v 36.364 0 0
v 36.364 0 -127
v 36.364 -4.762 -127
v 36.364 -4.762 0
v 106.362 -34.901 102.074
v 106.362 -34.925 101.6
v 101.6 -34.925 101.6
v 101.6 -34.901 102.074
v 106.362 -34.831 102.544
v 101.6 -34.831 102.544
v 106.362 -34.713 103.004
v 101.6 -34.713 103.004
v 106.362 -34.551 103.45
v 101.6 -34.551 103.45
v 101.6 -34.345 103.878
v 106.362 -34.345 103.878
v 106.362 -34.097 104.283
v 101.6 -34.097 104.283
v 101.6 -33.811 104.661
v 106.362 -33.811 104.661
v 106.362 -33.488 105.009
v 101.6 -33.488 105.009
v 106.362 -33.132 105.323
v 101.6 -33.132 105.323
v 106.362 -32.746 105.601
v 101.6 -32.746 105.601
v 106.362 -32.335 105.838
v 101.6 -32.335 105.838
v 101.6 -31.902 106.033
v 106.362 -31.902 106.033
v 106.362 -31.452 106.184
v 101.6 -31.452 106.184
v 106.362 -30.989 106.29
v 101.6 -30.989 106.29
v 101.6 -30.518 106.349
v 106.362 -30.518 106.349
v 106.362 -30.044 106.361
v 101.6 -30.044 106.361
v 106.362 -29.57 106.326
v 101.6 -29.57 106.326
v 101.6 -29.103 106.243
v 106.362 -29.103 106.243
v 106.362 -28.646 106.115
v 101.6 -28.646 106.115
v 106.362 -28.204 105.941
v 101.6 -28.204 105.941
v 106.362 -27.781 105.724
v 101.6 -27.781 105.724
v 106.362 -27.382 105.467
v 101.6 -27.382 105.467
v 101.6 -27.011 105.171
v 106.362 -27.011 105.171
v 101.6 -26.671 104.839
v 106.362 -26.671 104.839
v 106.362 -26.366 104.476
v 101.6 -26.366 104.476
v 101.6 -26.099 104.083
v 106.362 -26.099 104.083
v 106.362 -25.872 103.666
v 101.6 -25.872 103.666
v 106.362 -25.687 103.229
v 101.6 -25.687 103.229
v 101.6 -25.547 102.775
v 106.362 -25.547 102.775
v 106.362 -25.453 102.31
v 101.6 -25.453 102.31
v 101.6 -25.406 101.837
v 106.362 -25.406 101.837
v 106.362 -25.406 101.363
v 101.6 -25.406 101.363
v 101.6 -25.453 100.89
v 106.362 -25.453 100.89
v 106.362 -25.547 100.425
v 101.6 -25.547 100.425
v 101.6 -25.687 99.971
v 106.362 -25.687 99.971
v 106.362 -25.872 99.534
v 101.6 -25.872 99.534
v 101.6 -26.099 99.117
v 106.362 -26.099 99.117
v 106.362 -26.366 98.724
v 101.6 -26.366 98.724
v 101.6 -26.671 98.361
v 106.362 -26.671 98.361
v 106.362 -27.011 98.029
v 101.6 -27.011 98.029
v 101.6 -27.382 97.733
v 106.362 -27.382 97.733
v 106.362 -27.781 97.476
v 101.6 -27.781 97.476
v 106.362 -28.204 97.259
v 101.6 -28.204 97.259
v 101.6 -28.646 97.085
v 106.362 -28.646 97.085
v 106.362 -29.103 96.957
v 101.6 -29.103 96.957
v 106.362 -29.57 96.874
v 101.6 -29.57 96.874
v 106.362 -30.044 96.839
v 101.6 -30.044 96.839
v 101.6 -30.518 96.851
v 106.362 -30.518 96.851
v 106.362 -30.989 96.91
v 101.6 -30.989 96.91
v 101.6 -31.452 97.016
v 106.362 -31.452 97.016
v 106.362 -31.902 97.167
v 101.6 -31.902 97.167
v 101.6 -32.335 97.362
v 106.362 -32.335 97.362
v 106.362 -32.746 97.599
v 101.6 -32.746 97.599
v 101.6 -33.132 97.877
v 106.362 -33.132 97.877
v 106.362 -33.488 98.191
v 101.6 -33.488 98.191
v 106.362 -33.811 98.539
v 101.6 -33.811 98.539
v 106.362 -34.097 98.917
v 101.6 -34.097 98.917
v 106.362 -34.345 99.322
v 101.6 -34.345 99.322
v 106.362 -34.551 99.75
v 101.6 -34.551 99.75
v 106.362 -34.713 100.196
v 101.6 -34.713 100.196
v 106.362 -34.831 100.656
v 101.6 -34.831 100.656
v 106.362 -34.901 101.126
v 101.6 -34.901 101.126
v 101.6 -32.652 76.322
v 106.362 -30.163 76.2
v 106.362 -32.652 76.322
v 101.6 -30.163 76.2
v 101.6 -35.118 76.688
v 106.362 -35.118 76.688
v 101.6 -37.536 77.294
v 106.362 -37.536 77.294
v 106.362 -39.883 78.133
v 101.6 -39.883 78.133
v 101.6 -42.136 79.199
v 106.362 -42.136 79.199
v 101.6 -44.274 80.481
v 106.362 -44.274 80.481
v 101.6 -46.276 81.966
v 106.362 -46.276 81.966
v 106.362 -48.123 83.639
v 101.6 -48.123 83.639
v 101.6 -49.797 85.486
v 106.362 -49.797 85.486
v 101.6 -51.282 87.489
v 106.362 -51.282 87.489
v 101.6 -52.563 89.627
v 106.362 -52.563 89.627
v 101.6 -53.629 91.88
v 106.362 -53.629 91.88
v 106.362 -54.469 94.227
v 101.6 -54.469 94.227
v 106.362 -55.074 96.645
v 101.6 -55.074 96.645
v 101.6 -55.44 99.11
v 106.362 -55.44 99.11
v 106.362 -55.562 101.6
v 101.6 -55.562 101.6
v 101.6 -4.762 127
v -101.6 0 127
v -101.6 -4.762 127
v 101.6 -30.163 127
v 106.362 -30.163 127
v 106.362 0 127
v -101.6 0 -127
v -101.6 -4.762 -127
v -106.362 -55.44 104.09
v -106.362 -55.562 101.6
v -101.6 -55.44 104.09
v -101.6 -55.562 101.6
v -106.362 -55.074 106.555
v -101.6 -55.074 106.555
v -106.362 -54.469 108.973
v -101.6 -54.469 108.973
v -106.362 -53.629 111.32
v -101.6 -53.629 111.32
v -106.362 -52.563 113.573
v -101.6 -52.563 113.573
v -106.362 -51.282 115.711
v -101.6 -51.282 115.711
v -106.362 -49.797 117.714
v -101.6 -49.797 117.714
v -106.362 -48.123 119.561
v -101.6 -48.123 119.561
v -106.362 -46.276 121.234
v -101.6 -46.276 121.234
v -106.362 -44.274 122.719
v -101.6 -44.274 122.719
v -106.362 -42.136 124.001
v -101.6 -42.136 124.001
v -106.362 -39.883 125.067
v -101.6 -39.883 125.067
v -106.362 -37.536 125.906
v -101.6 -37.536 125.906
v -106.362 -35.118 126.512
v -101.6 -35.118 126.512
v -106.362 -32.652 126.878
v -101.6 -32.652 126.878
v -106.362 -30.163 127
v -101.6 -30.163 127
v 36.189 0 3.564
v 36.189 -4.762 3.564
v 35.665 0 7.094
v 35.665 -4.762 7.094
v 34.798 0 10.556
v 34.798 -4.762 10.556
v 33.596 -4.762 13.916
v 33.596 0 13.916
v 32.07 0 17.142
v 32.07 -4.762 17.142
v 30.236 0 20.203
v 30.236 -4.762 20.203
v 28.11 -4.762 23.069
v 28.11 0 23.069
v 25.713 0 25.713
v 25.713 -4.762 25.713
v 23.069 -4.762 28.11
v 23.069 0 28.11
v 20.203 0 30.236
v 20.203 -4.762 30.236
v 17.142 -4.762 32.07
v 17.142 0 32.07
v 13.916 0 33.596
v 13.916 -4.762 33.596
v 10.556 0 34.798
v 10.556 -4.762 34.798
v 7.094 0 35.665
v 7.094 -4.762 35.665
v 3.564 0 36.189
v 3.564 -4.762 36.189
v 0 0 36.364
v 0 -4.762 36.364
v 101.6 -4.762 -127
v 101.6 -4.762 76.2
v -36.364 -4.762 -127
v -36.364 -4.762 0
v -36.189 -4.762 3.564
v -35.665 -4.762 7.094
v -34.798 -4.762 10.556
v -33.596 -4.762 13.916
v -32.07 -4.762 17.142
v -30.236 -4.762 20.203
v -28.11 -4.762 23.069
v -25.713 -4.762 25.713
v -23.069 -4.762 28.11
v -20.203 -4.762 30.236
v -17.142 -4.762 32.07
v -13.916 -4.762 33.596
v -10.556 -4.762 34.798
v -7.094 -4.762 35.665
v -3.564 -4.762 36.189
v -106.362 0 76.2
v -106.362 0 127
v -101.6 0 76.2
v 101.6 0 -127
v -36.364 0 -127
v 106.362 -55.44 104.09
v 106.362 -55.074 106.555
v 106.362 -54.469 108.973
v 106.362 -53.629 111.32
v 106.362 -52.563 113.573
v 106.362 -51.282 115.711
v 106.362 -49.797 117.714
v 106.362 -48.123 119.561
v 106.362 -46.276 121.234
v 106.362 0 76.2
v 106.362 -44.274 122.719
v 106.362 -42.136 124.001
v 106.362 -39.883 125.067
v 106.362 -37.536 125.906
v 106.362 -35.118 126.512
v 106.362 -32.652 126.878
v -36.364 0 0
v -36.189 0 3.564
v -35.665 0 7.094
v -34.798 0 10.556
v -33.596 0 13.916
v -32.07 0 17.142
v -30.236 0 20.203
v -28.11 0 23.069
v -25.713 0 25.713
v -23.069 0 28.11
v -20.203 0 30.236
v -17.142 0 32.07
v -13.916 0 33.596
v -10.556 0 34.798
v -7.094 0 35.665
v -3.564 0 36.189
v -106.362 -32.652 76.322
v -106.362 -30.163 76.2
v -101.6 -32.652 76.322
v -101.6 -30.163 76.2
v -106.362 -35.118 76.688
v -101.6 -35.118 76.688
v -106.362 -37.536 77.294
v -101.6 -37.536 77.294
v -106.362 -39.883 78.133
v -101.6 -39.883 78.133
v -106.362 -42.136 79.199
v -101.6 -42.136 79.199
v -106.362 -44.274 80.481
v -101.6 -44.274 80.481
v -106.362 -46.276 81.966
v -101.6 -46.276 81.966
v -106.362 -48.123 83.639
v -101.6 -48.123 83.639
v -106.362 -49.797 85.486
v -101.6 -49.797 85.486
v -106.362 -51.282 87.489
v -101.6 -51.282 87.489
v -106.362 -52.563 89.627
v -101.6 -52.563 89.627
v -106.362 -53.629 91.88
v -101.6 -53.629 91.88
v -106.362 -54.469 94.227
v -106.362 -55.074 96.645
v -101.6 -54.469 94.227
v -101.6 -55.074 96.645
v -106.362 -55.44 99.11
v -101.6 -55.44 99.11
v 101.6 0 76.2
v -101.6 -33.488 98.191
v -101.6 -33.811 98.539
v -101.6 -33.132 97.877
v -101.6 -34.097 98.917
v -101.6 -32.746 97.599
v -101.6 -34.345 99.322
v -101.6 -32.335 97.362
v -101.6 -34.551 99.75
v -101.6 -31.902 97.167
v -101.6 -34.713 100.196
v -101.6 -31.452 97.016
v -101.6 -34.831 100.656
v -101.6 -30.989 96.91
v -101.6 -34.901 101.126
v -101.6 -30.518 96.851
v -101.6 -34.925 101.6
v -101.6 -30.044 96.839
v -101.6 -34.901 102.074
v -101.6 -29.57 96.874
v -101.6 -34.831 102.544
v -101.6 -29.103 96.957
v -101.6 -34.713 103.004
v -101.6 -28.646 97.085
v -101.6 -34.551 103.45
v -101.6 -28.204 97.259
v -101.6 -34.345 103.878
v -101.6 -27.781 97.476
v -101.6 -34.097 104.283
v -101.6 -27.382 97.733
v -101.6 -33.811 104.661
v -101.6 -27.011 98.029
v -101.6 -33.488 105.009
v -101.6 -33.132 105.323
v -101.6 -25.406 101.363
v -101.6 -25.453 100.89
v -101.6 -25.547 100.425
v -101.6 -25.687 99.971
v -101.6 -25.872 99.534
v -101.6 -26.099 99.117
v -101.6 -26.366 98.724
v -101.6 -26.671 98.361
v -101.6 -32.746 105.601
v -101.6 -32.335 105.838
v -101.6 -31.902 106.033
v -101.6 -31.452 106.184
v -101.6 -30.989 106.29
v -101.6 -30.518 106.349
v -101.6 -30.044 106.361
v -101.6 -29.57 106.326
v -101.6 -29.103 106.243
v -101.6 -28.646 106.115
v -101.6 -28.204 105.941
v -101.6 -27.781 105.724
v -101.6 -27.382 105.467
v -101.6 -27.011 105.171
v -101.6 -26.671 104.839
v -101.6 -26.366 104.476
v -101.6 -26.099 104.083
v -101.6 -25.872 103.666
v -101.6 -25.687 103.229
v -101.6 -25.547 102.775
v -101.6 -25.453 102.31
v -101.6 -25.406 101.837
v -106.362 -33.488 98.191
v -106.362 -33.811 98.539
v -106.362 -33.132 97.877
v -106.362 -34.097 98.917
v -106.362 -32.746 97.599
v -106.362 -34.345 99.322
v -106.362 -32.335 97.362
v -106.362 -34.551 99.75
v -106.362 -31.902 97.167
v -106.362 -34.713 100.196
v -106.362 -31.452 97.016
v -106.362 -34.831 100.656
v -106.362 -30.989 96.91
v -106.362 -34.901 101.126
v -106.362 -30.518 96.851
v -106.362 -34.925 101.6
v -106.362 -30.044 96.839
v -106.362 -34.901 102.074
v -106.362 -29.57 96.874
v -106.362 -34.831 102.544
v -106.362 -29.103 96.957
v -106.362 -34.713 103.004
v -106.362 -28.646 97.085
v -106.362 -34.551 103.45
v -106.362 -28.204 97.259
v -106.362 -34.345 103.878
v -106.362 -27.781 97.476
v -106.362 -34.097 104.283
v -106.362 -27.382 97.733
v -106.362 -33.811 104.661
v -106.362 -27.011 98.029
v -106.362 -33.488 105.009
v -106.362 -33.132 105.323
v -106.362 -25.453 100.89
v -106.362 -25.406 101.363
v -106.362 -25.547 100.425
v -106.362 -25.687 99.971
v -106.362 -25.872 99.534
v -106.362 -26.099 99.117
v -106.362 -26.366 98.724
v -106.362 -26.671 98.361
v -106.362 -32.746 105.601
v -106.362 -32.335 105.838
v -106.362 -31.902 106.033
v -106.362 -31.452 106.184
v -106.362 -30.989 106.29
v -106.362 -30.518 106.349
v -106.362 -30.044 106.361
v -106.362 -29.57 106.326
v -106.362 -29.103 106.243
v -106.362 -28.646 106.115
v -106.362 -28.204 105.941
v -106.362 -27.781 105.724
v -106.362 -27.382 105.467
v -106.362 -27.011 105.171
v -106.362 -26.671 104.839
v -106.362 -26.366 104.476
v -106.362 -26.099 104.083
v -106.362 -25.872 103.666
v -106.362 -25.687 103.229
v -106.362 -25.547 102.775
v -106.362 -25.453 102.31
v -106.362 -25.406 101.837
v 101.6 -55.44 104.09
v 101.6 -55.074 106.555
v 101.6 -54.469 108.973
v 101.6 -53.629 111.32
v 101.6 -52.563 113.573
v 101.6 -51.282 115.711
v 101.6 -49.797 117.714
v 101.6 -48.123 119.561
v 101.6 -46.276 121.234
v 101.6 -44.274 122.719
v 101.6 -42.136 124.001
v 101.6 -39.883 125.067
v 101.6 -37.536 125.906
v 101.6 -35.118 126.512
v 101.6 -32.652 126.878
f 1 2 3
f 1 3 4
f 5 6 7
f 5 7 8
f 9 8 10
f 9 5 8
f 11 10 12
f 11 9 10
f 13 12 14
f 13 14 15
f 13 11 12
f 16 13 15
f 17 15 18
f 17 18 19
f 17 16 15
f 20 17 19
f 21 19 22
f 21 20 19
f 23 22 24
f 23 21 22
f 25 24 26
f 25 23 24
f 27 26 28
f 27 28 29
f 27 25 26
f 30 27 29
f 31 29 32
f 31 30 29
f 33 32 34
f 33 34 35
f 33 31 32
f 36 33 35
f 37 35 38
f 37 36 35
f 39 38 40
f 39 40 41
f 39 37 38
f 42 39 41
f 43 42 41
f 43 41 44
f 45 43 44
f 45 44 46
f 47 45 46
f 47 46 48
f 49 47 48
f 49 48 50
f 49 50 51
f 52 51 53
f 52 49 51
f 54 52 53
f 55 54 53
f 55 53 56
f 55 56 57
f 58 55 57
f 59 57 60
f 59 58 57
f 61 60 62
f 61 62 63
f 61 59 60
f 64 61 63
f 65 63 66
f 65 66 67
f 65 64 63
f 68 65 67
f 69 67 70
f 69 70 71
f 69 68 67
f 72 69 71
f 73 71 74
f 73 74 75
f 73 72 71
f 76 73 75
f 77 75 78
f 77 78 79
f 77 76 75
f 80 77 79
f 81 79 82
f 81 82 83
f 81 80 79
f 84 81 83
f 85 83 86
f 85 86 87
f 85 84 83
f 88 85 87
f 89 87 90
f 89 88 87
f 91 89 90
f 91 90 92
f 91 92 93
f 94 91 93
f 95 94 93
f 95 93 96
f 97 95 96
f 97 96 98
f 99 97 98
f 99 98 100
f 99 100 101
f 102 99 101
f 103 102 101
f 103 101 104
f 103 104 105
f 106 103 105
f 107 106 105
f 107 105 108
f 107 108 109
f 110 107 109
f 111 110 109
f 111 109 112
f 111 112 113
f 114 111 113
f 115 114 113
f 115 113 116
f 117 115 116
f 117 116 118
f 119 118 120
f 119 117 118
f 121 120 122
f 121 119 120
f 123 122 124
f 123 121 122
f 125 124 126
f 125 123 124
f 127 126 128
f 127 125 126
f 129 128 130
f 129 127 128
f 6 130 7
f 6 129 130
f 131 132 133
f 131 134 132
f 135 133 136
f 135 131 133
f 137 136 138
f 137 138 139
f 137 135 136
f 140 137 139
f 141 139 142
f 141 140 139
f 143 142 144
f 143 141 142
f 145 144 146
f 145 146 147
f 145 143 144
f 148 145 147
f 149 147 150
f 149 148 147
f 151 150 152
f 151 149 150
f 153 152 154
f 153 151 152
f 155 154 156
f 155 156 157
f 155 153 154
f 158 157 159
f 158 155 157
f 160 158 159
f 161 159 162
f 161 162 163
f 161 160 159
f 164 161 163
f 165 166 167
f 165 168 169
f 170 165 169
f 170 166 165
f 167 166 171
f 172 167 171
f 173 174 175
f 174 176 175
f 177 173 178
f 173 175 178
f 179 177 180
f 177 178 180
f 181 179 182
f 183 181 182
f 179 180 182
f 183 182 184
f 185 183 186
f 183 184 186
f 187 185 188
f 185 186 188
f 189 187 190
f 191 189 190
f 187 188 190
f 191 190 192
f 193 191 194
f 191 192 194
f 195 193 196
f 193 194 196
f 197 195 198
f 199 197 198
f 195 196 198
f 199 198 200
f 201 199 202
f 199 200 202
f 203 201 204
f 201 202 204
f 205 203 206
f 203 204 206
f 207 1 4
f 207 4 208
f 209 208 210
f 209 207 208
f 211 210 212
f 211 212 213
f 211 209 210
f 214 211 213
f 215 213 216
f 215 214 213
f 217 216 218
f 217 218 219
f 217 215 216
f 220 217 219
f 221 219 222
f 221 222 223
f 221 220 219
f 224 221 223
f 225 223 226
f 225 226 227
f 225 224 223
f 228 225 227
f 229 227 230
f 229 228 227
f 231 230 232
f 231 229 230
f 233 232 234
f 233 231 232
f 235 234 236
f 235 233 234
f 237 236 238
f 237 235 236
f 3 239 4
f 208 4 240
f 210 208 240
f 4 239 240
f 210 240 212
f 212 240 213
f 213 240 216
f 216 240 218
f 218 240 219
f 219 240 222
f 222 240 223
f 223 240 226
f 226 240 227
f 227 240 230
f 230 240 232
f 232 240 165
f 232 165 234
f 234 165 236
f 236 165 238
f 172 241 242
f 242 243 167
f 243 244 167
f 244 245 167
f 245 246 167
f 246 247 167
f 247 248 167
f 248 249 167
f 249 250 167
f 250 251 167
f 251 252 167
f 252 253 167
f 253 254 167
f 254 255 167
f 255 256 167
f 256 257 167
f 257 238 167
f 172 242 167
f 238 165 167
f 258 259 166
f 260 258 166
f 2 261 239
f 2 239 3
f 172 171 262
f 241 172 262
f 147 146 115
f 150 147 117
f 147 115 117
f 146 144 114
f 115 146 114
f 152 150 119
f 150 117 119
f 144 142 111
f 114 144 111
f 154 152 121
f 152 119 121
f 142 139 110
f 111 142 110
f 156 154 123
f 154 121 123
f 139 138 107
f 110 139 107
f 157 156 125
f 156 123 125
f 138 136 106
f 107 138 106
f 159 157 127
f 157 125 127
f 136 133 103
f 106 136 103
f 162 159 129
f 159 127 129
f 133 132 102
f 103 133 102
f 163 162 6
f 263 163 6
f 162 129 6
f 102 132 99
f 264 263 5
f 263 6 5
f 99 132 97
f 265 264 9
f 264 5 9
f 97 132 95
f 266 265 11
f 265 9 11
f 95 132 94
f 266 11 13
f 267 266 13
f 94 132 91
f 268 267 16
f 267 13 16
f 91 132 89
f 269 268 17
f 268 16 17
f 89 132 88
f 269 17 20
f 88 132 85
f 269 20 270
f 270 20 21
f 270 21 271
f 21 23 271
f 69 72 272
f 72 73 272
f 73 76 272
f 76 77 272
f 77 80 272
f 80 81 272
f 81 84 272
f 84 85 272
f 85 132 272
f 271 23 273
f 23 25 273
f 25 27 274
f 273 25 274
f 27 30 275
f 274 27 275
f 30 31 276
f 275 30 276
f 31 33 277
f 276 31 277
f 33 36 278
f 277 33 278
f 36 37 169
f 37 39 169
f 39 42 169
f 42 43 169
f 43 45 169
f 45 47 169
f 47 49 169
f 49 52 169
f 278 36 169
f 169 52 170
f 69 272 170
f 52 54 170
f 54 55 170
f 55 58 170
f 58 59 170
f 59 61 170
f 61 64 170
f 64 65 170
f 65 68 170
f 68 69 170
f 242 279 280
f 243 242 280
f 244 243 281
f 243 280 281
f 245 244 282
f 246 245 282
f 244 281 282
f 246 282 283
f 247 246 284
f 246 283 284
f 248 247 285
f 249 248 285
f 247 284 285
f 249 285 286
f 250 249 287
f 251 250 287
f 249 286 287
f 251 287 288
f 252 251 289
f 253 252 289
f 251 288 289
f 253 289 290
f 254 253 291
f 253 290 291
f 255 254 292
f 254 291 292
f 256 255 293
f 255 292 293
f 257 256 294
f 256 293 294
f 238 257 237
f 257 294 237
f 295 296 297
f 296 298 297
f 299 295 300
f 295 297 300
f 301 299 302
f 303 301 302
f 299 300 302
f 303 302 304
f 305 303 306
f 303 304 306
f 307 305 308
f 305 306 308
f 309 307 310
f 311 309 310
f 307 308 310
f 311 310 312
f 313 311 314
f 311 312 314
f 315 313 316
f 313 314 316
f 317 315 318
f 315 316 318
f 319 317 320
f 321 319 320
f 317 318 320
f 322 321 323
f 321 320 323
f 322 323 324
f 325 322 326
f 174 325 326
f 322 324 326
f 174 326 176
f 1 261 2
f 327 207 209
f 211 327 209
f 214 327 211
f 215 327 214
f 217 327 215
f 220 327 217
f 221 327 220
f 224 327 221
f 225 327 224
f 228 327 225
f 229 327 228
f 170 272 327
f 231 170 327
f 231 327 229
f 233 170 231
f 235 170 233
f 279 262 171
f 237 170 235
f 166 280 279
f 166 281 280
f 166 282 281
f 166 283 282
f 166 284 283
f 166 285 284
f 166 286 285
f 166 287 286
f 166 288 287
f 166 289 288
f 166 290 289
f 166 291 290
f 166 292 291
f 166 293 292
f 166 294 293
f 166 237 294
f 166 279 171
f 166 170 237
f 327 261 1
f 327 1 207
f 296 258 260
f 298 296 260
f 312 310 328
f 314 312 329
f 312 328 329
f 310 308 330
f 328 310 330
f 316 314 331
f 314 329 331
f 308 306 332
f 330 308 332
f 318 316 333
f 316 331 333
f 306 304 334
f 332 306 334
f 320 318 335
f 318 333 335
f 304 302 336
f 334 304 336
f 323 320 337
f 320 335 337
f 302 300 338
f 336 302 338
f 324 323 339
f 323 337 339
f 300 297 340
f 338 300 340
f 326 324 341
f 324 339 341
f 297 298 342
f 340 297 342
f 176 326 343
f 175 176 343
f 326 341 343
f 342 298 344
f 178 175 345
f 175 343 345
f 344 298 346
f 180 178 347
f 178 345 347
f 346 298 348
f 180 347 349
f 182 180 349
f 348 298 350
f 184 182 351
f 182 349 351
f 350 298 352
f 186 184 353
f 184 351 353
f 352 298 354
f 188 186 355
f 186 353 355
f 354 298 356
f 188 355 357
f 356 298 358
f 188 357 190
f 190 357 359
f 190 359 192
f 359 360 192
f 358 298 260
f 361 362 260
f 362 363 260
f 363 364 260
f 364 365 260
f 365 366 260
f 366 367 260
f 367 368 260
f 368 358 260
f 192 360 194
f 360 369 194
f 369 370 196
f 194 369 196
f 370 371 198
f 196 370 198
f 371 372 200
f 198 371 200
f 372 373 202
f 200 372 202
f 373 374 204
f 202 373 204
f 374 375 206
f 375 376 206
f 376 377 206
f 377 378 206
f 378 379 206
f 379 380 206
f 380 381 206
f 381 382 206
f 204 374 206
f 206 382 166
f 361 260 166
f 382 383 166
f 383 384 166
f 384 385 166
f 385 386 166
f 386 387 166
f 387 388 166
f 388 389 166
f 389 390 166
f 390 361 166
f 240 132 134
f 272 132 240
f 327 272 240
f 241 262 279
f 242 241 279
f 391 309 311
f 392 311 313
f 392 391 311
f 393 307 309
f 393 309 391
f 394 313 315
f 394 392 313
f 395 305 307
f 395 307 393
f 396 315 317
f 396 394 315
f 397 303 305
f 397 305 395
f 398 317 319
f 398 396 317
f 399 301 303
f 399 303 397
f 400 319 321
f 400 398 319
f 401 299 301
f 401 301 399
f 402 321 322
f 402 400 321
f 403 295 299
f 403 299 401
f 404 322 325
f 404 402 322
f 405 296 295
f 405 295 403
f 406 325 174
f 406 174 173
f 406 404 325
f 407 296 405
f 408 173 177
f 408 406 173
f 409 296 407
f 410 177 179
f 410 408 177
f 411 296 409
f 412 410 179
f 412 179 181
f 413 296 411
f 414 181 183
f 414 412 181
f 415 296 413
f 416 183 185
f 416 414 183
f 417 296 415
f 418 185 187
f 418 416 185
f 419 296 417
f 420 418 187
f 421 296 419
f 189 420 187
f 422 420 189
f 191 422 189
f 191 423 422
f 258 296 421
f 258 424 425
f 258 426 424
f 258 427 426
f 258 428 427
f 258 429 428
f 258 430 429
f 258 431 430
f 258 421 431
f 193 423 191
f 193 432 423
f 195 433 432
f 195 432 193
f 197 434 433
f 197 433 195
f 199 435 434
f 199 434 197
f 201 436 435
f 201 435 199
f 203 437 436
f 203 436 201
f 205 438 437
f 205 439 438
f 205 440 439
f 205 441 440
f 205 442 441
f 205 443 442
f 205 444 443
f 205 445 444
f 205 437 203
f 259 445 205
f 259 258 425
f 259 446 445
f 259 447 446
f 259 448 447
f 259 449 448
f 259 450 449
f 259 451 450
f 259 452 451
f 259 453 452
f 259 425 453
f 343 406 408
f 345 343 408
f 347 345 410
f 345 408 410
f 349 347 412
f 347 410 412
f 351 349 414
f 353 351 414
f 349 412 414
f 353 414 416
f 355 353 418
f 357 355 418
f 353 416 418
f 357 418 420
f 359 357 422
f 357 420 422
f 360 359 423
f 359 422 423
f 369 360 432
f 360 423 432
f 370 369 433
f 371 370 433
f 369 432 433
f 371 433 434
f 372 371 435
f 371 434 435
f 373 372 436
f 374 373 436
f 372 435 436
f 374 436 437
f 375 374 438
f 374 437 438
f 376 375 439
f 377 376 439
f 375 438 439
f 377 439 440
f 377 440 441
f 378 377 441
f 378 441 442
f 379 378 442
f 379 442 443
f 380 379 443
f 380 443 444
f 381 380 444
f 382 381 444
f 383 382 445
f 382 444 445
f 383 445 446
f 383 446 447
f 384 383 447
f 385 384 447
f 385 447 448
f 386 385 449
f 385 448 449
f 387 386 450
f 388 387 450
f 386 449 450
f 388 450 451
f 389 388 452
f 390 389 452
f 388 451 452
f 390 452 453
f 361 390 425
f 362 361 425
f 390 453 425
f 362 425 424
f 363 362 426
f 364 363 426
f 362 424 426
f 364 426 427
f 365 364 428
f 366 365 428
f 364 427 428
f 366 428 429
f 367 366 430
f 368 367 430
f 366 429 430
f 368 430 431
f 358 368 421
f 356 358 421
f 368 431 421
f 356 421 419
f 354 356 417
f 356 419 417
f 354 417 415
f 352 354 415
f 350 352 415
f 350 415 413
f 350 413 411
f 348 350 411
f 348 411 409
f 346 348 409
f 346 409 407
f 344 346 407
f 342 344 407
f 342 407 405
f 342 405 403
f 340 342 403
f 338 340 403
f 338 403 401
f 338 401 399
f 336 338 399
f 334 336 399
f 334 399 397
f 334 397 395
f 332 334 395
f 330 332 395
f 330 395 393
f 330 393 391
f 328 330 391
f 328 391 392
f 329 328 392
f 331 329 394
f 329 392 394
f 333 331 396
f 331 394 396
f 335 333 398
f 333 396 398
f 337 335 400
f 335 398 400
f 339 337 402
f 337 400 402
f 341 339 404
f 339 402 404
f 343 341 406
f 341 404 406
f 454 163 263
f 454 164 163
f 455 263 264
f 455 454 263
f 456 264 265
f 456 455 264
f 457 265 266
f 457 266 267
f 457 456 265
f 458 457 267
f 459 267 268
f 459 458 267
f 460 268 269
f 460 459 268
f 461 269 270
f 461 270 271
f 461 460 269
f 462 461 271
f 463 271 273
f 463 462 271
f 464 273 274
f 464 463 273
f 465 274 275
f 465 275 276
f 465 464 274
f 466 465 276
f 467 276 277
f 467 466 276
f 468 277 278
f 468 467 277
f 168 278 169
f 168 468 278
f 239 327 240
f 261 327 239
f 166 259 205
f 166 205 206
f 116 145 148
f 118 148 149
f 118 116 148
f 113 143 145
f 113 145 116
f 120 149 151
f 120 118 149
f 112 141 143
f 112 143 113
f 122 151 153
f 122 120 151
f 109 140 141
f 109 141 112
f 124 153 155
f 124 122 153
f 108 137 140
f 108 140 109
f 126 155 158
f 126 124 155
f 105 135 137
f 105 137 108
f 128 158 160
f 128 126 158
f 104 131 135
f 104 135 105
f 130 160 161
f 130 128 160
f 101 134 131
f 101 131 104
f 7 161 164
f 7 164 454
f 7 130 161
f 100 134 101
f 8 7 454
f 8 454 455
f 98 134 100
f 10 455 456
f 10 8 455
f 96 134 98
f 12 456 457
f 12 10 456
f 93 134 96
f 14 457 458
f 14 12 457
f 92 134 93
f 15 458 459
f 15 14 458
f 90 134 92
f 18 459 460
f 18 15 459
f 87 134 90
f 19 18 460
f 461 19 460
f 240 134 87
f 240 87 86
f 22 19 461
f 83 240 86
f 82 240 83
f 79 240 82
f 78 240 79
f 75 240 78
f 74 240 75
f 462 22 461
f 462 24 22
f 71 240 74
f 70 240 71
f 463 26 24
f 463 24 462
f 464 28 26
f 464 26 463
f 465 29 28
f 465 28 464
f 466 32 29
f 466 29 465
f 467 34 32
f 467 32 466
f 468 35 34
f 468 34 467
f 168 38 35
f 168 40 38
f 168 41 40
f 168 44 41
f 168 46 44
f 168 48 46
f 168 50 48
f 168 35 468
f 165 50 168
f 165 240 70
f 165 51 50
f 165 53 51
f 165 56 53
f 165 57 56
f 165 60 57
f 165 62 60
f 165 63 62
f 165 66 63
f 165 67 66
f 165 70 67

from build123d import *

# Parameters (mm, degrees)
F1_DEPTH = 4.7625
F2_W     = 4.7625
F2_H     = 50.8
F3_DEPTH = 55.5625
F4_R     = 4.7625
F5_DEPTH = 4.7625
F6_R     = 25.39999


# Not quite as in the source:
# - a fillet or chamfer is up to 0.001 mm smaller than in the source, because OpenCascade refuses the exact size


with BuildPart() as f1:
    # F0 (on Front) → F1 (new body)
    with BuildSketch(Plane.XZ):
        with BuildLine():
            Line((-101.6, 127), (-101.6, -127))
            Line((-101.6, -127), (-36.3640275955, -127))
            Line((-36.3640275955, -127), (-36.3640275955, 0))
            ThreePointArc((-36.3640275955, 0), (-25.713250504, 25.713250504), (0, 36.3640275955))
            Line((0, 36.3640275955), (0, 127))
            Line((0, 127), (-101.6, 127))
        make_face()
    extrude(amount=F1_DEPTH)



with BuildPart() as f3:
    # F2 (on Front) → F3 (new body)
    with BuildSketch(Plane.XZ):
        with Locations((-103.98125, 101.6)):
            Rectangle(F2_W, F2_H)
    extrude(amount=F3_DEPTH)

    # F4 (on face) → F5 (cut, through all)
    with BuildSketch(Plane(origin=(-106.3625, 0, 0), x_dir=(0, -1, 0), z_dir=(-1, 0, 0))):
        with Locations((30.1625, 101.6)):
            Circle(F4_R)
    extrude(amount=-F5_DEPTH, mode=Mode.SUBTRACT)

    # F6 (radius 25.4 in the source; OpenCascade refuses exactly that, so slightly less here)
    f6_edges = [f3.edges().sort_by_distance(p)[0] for p in [
        (-103.98125, -55.5625, 127),
        (-103.98125, -55.5625, 76.2),
    ]]
    fillet(f6_edges, radius=F6_R)


with BuildPart() as f1_1:
    add(f1.part)
    # F7: F3, F1 across plane
    add(f3.part.mirror(Plane.YZ))
    add(f1.part.mirror(Plane.YZ))


solid = Compound([f3.part, f1_1.part])
